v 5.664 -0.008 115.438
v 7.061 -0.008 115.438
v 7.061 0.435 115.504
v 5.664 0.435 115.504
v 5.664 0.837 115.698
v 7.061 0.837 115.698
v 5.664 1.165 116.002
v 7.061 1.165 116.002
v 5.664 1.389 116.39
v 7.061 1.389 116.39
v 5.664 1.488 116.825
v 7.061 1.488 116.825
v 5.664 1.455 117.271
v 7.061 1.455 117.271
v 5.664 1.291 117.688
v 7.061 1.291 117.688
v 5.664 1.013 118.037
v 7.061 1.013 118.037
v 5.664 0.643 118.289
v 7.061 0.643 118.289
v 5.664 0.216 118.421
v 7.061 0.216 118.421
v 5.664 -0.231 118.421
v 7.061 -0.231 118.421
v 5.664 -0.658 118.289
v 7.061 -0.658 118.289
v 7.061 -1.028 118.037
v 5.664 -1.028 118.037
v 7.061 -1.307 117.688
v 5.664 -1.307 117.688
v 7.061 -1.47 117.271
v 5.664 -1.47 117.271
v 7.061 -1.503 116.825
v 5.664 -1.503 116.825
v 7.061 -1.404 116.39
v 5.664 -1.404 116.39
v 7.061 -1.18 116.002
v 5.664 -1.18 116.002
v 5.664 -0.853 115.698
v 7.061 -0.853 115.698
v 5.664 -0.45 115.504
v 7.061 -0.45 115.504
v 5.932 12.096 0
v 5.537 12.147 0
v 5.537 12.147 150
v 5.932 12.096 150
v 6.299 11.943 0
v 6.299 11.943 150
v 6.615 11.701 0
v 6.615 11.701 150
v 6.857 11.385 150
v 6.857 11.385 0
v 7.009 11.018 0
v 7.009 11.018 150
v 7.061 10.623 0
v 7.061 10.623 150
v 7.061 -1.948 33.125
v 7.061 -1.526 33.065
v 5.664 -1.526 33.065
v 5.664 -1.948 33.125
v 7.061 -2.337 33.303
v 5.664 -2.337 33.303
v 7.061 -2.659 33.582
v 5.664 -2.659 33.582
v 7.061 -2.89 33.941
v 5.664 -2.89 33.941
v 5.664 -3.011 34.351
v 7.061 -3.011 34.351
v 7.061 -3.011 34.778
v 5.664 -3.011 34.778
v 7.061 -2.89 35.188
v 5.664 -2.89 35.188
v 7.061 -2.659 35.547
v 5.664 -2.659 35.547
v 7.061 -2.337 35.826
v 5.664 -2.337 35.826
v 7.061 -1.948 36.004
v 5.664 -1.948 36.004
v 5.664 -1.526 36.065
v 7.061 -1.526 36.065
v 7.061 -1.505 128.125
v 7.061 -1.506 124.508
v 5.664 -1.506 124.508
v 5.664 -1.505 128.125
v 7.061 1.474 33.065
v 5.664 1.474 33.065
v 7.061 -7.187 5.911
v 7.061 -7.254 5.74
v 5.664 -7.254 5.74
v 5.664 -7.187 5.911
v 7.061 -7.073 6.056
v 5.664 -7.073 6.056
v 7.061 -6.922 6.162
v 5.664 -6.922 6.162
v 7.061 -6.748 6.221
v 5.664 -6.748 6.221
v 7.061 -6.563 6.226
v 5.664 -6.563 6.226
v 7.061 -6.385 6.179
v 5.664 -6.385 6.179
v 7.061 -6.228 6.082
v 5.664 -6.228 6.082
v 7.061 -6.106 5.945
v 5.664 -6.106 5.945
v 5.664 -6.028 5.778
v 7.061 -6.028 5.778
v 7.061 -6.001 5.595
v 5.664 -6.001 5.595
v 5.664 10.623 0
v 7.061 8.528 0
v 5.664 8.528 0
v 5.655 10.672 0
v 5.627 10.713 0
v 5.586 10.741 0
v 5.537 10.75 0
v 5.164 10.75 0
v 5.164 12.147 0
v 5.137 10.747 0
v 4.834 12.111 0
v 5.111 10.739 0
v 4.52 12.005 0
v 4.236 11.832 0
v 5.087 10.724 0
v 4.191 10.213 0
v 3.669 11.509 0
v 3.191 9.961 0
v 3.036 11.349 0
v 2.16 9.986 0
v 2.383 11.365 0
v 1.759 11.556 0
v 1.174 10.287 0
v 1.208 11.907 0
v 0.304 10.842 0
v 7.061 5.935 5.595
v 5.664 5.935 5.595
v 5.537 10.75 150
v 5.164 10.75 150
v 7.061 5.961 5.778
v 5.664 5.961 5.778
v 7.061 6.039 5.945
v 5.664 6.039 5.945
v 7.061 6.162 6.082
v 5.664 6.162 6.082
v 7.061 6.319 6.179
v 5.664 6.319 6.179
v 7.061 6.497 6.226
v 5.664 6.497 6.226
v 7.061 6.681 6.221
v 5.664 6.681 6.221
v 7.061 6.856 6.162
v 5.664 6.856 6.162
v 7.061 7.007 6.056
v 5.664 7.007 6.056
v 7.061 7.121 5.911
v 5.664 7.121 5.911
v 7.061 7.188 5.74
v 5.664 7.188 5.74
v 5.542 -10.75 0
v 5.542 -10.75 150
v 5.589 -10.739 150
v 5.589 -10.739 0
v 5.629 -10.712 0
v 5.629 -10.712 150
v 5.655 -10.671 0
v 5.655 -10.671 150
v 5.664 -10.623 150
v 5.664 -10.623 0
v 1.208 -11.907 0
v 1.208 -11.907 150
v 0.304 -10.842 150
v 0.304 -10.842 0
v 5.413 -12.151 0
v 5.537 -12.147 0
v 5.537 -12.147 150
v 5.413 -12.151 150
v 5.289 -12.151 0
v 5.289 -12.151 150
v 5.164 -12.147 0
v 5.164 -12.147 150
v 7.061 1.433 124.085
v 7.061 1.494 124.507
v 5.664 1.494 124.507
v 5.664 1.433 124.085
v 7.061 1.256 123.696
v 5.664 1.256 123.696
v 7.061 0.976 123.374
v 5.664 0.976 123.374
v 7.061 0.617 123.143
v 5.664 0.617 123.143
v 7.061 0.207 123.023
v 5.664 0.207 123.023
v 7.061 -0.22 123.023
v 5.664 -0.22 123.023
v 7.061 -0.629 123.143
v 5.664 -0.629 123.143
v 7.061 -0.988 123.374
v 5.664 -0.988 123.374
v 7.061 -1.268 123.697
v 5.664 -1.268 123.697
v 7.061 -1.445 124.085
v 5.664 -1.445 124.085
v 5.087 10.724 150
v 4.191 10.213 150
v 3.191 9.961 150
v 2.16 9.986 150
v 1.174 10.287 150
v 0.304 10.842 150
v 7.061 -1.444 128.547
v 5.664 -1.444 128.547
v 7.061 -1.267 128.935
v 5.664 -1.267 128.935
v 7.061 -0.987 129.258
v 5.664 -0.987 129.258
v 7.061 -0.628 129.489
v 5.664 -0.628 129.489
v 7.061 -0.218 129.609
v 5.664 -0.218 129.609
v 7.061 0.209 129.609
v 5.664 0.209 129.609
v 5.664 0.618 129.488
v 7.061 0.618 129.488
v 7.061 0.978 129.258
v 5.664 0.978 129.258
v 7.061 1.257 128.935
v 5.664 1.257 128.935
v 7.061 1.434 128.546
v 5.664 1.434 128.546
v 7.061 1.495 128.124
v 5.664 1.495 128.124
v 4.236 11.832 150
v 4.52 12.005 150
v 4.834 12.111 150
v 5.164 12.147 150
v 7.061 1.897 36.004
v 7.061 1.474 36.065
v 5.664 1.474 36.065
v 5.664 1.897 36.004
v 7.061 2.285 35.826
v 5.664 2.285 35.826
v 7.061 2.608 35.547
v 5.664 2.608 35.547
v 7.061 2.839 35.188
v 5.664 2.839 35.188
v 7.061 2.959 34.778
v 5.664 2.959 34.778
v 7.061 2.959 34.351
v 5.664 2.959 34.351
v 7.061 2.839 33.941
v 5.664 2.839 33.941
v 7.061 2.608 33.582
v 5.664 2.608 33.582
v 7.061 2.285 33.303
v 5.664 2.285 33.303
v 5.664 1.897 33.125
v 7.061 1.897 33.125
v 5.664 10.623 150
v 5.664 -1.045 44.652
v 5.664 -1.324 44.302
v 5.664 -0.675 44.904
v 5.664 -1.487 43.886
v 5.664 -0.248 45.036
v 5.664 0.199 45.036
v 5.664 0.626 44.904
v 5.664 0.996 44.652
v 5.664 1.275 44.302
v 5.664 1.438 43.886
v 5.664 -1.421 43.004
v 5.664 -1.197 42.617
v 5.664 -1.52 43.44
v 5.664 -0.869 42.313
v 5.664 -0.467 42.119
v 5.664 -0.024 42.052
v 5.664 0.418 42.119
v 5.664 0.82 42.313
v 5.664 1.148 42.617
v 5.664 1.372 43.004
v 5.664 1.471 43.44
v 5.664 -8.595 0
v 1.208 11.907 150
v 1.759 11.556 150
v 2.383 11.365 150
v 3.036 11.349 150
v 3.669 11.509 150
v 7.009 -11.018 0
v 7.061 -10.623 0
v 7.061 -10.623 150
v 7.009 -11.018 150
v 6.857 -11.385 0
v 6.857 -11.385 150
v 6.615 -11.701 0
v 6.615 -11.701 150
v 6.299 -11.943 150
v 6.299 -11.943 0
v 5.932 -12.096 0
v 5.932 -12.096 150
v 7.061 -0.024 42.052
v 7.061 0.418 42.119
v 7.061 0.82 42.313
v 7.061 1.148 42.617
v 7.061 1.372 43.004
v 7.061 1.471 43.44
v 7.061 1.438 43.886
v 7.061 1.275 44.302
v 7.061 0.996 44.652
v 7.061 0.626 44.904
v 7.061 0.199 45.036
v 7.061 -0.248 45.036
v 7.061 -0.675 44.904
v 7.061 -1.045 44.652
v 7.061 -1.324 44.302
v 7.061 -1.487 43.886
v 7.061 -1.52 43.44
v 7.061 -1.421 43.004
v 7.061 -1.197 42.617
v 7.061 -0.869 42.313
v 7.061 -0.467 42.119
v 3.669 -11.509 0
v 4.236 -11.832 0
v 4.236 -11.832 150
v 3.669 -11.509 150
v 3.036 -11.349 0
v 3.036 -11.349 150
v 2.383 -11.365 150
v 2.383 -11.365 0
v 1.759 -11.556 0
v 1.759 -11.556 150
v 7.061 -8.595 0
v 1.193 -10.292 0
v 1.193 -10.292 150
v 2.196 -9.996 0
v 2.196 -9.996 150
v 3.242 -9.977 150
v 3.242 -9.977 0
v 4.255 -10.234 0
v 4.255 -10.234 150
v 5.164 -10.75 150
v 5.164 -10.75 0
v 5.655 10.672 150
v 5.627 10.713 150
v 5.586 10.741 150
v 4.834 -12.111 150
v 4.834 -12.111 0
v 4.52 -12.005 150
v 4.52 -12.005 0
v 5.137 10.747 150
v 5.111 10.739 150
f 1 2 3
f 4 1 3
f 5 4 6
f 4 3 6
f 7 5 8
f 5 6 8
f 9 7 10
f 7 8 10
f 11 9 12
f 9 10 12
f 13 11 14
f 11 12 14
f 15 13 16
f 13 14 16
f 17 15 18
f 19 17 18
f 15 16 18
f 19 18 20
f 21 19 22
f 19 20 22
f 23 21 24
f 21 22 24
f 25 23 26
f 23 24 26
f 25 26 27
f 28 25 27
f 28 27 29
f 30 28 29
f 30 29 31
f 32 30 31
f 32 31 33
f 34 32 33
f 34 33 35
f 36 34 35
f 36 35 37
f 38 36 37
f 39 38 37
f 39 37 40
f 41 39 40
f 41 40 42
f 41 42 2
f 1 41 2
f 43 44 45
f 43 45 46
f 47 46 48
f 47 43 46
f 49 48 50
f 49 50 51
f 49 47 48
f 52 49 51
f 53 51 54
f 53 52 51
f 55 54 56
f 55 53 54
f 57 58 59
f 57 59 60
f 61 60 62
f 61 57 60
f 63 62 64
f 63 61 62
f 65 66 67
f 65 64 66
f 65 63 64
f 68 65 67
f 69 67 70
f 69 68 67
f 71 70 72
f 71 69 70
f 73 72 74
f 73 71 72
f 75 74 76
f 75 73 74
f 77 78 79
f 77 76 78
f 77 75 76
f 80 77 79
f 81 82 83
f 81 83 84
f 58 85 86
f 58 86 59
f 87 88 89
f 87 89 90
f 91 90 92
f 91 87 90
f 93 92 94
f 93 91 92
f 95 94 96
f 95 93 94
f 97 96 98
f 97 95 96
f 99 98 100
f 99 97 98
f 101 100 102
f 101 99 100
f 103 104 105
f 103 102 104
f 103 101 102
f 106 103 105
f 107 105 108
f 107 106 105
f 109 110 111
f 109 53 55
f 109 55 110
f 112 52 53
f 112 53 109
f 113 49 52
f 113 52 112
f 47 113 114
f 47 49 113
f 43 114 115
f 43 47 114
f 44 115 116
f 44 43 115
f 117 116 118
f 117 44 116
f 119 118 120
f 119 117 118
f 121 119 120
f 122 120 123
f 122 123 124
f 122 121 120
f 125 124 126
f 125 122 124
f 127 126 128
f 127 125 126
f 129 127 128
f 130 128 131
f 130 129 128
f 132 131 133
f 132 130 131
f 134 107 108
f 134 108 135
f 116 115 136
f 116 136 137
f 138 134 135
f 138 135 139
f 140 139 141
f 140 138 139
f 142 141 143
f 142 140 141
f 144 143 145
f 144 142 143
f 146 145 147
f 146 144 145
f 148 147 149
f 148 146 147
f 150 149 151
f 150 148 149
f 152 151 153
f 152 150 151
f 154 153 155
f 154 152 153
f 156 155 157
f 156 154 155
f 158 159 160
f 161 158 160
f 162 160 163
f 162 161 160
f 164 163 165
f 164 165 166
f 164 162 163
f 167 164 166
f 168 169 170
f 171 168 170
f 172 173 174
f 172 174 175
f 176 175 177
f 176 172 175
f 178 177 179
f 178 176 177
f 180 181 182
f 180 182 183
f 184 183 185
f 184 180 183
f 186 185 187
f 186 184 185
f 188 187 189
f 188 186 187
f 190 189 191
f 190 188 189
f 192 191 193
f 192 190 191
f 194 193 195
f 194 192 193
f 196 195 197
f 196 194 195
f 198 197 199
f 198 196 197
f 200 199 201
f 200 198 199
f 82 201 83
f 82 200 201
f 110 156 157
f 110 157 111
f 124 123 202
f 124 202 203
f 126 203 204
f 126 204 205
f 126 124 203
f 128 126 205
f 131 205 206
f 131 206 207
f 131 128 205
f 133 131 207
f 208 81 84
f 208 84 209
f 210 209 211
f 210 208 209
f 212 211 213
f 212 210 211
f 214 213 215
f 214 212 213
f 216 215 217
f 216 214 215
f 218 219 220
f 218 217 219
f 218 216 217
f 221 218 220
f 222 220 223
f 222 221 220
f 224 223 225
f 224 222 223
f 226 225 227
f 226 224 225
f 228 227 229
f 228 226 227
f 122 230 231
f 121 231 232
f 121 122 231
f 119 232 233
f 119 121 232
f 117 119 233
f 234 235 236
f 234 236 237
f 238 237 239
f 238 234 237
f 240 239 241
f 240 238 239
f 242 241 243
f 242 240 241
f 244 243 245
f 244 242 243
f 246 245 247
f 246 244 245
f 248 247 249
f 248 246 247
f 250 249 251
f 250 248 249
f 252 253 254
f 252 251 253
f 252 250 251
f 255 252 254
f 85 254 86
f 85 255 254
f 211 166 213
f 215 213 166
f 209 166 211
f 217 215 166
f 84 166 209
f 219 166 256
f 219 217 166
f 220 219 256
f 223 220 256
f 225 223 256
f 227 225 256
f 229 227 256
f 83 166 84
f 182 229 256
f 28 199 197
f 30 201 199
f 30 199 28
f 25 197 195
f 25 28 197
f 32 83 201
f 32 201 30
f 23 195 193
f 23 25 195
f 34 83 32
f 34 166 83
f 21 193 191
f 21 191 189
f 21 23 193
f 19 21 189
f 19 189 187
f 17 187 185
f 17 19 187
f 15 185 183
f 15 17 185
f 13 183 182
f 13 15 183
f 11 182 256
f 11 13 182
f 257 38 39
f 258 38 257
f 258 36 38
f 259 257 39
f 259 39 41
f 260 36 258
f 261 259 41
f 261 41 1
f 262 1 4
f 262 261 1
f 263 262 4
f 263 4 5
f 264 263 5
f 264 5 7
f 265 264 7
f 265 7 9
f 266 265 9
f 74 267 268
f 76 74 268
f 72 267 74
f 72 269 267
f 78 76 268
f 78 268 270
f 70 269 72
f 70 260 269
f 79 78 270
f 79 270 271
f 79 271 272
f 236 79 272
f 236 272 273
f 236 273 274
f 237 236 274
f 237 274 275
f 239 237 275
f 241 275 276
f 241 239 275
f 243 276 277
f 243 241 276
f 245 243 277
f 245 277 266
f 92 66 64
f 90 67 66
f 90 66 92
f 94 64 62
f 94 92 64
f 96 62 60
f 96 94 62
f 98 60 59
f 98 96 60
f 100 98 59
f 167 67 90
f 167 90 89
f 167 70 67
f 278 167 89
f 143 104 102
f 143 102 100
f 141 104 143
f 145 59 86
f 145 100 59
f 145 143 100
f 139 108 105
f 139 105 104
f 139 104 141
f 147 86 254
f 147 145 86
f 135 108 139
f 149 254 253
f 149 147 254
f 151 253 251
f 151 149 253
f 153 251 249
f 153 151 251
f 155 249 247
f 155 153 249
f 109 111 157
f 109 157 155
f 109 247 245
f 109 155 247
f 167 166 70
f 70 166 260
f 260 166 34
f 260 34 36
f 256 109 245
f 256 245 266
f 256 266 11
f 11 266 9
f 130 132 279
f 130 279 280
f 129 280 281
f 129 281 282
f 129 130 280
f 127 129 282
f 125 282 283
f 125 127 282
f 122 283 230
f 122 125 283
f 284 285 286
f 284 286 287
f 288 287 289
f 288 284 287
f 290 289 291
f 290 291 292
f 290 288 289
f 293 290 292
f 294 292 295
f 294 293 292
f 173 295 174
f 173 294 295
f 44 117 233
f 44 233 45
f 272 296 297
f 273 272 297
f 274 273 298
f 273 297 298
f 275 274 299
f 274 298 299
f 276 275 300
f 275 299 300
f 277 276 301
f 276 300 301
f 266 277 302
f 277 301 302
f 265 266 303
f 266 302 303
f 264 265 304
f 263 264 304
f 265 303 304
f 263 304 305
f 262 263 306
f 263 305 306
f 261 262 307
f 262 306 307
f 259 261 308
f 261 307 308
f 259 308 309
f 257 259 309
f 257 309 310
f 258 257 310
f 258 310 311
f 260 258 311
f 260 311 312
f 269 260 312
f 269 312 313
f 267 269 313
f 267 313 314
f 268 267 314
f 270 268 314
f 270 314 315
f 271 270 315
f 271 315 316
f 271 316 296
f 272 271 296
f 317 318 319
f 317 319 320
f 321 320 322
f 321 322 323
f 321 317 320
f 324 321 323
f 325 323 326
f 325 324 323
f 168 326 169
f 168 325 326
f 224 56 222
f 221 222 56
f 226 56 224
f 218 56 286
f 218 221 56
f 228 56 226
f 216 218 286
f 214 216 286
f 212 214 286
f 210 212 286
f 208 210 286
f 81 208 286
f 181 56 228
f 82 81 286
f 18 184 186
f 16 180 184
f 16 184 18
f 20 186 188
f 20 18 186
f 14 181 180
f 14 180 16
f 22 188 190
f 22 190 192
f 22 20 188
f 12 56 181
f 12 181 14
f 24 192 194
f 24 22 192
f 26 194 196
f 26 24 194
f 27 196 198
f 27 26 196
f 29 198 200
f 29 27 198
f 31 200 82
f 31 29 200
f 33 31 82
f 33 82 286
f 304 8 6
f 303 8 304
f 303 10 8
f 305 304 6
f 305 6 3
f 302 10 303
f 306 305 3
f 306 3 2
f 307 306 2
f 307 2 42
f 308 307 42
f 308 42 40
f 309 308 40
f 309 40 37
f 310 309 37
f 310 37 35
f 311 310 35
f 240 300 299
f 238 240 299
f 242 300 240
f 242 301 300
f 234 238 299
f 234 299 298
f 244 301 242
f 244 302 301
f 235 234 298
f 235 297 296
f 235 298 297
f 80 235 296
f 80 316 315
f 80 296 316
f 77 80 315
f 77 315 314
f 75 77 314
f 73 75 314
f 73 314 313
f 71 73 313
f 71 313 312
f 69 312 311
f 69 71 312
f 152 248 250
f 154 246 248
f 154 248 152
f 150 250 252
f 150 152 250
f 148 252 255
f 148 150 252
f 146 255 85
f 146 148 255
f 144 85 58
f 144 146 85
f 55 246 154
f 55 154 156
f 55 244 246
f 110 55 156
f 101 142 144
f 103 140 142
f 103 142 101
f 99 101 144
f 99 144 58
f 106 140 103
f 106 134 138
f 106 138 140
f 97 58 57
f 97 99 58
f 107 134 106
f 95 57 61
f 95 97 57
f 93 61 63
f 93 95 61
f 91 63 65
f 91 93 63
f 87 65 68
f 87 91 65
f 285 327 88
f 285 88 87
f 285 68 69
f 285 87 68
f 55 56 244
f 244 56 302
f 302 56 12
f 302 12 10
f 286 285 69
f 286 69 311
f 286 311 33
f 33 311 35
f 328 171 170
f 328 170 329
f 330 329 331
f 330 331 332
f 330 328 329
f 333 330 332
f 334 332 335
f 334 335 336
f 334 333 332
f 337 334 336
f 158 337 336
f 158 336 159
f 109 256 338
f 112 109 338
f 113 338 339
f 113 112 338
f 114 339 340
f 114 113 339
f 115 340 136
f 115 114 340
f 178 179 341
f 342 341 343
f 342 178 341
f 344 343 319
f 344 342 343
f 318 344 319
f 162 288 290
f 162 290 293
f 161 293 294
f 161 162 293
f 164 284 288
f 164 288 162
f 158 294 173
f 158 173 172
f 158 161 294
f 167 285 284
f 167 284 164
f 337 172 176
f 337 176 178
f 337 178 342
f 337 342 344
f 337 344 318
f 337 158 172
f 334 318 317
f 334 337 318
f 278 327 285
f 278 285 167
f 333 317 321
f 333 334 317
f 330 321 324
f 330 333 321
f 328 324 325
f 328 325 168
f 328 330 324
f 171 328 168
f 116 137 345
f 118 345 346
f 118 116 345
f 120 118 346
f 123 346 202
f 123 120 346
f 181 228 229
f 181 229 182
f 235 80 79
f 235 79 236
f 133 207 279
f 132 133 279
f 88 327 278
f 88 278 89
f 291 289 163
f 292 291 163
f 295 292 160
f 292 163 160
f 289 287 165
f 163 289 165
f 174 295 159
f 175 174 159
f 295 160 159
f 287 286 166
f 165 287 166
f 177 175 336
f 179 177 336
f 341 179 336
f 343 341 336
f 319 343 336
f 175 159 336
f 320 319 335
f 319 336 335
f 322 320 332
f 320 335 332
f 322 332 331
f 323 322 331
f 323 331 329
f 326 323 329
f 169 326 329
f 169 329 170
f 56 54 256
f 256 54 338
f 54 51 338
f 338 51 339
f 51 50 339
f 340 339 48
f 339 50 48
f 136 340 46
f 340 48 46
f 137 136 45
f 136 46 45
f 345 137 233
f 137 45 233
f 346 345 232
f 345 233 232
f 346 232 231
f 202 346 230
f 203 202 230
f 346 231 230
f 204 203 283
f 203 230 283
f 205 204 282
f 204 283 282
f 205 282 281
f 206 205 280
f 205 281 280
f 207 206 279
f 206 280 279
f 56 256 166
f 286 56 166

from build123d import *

# Parameters (mm, degrees)
BOSS_EXTRUDE1_DEPTH = 150
CUT_EXTRUDE2_DEPTH  = 151.642968673
SKETCH4_R           = 1.5
CUT_EXTRUDE3_DEPTH  = 151.642968673


with BuildPart() as part:
    # Sketch1 → Boss-Extrude1 (new body)
    with BuildSketch(Plane.XY):
        with BuildLine():
            Line((5.164341455, -10.750486483), (5.541822139, -10.750486483))
            ThreePointArc((5.541822139, -10.750486483), (5.628611698, -10.711655392), (5.6642, -10.623486496))
            Line((5.6642, -10.623486496), (5.6642, 10.623486496))
            ThreePointArc((5.6642, 10.623486496), (5.627002565, 10.713289048), (5.537200013, 10.750486483))
            Line((5.537200013, 10.750486483), (5.164341455, 10.750486483))
            ThreePointArc((5.164341455, 10.750486483), (5.123513594, 10.743744895), (5.087020295, 10.724235863))
            ThreePointArc((5.087020295, 10.724235863), (2.674694689, 9.938287609), (0.304054167, 10.842219578))
            Line((0.304054167, 10.842219578), (1.208194452, 11.907179363))
            ThreePointArc((1.208194452, 11.907179363), (2.709144677, 11.334862777), (4.236487447, 11.83247901))
            ThreePointArc((4.236487447, 11.83247901), (4.67440708, 12.066587417), (5.164341455, 12.147486483))
            Line((5.164341455, 12.147486483), (5.537200013, 12.147486483))
            ThreePointArc((5.537200013, 12.147486483), (6.614830738, 11.701117221), (7.0612, 10.623486496))
            Line((7.0612, 10.623486496), (7.0612, -10.623486496))
            ThreePointArc((7.0612, -10.623486496), (6.614830738, -11.701117221), (5.537200013, -12.147486483))
            ThreePointArc((5.537200013, -12.147486483), (5.350770734, -12.150925507), (5.164341455, -12.147486483))
            ThreePointArc((5.164341455, -12.147486483), (4.67440708, -12.066587417), (4.236487447, -11.83247901))
            ThreePointArc((4.236487447, -11.83247901), (2.709144677, -11.334862777), (1.208194452, -11.907179363))
            Line((1.208194452, -11.907179363), (0.304054167, -10.842219578))
            ThreePointArc((0.304054167, -10.842219578), (2.718249509, -9.951365406), (5.164341455, -10.750486483))
        make_face()
    extrude(amount=BOSS_EXTRUDE1_DEPTH)

    # Sketch2 → Cut-Extrude2 (cut, through all)
    with BuildSketch(Plane(origin=(7.0612, 0, 0), x_dir=(0, 0, -1), z_dir=(1, 0, 0))):
        with BuildLine():
            Line((0.119534124, 8.556064117), (0.119534124, -8.622507572))
            Line((0.119534124, -8.622507572), (-5.739792333, -7.254437811))
            ThreePointArc((-5.739792333, -7.254437811), (-6.226240725, -6.563404626), (-5.595417274, -6.001069606))
            Line((-5.595417274, -6.001069606), (-5.595417274, 5.934626152))
            ThreePointArc((-5.595417274, 5.934626152), (-6.226240725, 6.496961172), (-5.739792333, 7.187994357))
            Line((-5.739792333, 7.187994357), (0.119534124, 8.556064117))
        make_face()
    extrude(amount=-CUT_EXTRUDE2_DEPTH, mode=Mode.SUBTRACT)

    # Sketch4 → Cut-Extrude3 (cut, through all)
    with BuildSketch(Plane(origin=(7.0612, 0, 0), x_dir=(0, 0, -1), z_dir=(1, 0, 0))):
        with Locations((-116.937524646, -0.007606355)):
            Circle(SKETCH4_R)
        with Locations((-43.552387309, -0.024489344)):
            Circle(SKETCH4_R)
        with BuildLine():
            Line((-33.064580696, 1.474128733), (-33.064580696, -1.525871267))
            ThreePointArc((-33.064580696, -1.525871267), (-34.564580696, -3.025871267), (-36.064580696, -1.525871267))
            Line((-36.064580696, -1.525871267), (-36.064580696, 1.474128733))
            ThreePointArc((-36.064580696, 1.474128733), (-34.564580696, 2.974128733), (-33.064580696, 1.474128733))
        make_face()
        with BuildLine():
            Line((-128.12384742, 1.494967211), (-124.507385363, 1.494135207))
            ThreePointArc((-124.507385363, 1.494135207), (-123.007730493, -0.006209843), (-124.508075543, -1.505864713))
            Line((-124.508075543, -1.505864713), (-128.1245376, -1.50503271))
            ThreePointArc((-128.1245376, -1.50503271), (-129.62419247, -0.00468766), (-128.12384742, 1.494967211))
        make_face()
    extrude(amount=-CUT_EXTRUDE3_DEPTH, mode=Mode.SUBTRACT)


solid = part.part
